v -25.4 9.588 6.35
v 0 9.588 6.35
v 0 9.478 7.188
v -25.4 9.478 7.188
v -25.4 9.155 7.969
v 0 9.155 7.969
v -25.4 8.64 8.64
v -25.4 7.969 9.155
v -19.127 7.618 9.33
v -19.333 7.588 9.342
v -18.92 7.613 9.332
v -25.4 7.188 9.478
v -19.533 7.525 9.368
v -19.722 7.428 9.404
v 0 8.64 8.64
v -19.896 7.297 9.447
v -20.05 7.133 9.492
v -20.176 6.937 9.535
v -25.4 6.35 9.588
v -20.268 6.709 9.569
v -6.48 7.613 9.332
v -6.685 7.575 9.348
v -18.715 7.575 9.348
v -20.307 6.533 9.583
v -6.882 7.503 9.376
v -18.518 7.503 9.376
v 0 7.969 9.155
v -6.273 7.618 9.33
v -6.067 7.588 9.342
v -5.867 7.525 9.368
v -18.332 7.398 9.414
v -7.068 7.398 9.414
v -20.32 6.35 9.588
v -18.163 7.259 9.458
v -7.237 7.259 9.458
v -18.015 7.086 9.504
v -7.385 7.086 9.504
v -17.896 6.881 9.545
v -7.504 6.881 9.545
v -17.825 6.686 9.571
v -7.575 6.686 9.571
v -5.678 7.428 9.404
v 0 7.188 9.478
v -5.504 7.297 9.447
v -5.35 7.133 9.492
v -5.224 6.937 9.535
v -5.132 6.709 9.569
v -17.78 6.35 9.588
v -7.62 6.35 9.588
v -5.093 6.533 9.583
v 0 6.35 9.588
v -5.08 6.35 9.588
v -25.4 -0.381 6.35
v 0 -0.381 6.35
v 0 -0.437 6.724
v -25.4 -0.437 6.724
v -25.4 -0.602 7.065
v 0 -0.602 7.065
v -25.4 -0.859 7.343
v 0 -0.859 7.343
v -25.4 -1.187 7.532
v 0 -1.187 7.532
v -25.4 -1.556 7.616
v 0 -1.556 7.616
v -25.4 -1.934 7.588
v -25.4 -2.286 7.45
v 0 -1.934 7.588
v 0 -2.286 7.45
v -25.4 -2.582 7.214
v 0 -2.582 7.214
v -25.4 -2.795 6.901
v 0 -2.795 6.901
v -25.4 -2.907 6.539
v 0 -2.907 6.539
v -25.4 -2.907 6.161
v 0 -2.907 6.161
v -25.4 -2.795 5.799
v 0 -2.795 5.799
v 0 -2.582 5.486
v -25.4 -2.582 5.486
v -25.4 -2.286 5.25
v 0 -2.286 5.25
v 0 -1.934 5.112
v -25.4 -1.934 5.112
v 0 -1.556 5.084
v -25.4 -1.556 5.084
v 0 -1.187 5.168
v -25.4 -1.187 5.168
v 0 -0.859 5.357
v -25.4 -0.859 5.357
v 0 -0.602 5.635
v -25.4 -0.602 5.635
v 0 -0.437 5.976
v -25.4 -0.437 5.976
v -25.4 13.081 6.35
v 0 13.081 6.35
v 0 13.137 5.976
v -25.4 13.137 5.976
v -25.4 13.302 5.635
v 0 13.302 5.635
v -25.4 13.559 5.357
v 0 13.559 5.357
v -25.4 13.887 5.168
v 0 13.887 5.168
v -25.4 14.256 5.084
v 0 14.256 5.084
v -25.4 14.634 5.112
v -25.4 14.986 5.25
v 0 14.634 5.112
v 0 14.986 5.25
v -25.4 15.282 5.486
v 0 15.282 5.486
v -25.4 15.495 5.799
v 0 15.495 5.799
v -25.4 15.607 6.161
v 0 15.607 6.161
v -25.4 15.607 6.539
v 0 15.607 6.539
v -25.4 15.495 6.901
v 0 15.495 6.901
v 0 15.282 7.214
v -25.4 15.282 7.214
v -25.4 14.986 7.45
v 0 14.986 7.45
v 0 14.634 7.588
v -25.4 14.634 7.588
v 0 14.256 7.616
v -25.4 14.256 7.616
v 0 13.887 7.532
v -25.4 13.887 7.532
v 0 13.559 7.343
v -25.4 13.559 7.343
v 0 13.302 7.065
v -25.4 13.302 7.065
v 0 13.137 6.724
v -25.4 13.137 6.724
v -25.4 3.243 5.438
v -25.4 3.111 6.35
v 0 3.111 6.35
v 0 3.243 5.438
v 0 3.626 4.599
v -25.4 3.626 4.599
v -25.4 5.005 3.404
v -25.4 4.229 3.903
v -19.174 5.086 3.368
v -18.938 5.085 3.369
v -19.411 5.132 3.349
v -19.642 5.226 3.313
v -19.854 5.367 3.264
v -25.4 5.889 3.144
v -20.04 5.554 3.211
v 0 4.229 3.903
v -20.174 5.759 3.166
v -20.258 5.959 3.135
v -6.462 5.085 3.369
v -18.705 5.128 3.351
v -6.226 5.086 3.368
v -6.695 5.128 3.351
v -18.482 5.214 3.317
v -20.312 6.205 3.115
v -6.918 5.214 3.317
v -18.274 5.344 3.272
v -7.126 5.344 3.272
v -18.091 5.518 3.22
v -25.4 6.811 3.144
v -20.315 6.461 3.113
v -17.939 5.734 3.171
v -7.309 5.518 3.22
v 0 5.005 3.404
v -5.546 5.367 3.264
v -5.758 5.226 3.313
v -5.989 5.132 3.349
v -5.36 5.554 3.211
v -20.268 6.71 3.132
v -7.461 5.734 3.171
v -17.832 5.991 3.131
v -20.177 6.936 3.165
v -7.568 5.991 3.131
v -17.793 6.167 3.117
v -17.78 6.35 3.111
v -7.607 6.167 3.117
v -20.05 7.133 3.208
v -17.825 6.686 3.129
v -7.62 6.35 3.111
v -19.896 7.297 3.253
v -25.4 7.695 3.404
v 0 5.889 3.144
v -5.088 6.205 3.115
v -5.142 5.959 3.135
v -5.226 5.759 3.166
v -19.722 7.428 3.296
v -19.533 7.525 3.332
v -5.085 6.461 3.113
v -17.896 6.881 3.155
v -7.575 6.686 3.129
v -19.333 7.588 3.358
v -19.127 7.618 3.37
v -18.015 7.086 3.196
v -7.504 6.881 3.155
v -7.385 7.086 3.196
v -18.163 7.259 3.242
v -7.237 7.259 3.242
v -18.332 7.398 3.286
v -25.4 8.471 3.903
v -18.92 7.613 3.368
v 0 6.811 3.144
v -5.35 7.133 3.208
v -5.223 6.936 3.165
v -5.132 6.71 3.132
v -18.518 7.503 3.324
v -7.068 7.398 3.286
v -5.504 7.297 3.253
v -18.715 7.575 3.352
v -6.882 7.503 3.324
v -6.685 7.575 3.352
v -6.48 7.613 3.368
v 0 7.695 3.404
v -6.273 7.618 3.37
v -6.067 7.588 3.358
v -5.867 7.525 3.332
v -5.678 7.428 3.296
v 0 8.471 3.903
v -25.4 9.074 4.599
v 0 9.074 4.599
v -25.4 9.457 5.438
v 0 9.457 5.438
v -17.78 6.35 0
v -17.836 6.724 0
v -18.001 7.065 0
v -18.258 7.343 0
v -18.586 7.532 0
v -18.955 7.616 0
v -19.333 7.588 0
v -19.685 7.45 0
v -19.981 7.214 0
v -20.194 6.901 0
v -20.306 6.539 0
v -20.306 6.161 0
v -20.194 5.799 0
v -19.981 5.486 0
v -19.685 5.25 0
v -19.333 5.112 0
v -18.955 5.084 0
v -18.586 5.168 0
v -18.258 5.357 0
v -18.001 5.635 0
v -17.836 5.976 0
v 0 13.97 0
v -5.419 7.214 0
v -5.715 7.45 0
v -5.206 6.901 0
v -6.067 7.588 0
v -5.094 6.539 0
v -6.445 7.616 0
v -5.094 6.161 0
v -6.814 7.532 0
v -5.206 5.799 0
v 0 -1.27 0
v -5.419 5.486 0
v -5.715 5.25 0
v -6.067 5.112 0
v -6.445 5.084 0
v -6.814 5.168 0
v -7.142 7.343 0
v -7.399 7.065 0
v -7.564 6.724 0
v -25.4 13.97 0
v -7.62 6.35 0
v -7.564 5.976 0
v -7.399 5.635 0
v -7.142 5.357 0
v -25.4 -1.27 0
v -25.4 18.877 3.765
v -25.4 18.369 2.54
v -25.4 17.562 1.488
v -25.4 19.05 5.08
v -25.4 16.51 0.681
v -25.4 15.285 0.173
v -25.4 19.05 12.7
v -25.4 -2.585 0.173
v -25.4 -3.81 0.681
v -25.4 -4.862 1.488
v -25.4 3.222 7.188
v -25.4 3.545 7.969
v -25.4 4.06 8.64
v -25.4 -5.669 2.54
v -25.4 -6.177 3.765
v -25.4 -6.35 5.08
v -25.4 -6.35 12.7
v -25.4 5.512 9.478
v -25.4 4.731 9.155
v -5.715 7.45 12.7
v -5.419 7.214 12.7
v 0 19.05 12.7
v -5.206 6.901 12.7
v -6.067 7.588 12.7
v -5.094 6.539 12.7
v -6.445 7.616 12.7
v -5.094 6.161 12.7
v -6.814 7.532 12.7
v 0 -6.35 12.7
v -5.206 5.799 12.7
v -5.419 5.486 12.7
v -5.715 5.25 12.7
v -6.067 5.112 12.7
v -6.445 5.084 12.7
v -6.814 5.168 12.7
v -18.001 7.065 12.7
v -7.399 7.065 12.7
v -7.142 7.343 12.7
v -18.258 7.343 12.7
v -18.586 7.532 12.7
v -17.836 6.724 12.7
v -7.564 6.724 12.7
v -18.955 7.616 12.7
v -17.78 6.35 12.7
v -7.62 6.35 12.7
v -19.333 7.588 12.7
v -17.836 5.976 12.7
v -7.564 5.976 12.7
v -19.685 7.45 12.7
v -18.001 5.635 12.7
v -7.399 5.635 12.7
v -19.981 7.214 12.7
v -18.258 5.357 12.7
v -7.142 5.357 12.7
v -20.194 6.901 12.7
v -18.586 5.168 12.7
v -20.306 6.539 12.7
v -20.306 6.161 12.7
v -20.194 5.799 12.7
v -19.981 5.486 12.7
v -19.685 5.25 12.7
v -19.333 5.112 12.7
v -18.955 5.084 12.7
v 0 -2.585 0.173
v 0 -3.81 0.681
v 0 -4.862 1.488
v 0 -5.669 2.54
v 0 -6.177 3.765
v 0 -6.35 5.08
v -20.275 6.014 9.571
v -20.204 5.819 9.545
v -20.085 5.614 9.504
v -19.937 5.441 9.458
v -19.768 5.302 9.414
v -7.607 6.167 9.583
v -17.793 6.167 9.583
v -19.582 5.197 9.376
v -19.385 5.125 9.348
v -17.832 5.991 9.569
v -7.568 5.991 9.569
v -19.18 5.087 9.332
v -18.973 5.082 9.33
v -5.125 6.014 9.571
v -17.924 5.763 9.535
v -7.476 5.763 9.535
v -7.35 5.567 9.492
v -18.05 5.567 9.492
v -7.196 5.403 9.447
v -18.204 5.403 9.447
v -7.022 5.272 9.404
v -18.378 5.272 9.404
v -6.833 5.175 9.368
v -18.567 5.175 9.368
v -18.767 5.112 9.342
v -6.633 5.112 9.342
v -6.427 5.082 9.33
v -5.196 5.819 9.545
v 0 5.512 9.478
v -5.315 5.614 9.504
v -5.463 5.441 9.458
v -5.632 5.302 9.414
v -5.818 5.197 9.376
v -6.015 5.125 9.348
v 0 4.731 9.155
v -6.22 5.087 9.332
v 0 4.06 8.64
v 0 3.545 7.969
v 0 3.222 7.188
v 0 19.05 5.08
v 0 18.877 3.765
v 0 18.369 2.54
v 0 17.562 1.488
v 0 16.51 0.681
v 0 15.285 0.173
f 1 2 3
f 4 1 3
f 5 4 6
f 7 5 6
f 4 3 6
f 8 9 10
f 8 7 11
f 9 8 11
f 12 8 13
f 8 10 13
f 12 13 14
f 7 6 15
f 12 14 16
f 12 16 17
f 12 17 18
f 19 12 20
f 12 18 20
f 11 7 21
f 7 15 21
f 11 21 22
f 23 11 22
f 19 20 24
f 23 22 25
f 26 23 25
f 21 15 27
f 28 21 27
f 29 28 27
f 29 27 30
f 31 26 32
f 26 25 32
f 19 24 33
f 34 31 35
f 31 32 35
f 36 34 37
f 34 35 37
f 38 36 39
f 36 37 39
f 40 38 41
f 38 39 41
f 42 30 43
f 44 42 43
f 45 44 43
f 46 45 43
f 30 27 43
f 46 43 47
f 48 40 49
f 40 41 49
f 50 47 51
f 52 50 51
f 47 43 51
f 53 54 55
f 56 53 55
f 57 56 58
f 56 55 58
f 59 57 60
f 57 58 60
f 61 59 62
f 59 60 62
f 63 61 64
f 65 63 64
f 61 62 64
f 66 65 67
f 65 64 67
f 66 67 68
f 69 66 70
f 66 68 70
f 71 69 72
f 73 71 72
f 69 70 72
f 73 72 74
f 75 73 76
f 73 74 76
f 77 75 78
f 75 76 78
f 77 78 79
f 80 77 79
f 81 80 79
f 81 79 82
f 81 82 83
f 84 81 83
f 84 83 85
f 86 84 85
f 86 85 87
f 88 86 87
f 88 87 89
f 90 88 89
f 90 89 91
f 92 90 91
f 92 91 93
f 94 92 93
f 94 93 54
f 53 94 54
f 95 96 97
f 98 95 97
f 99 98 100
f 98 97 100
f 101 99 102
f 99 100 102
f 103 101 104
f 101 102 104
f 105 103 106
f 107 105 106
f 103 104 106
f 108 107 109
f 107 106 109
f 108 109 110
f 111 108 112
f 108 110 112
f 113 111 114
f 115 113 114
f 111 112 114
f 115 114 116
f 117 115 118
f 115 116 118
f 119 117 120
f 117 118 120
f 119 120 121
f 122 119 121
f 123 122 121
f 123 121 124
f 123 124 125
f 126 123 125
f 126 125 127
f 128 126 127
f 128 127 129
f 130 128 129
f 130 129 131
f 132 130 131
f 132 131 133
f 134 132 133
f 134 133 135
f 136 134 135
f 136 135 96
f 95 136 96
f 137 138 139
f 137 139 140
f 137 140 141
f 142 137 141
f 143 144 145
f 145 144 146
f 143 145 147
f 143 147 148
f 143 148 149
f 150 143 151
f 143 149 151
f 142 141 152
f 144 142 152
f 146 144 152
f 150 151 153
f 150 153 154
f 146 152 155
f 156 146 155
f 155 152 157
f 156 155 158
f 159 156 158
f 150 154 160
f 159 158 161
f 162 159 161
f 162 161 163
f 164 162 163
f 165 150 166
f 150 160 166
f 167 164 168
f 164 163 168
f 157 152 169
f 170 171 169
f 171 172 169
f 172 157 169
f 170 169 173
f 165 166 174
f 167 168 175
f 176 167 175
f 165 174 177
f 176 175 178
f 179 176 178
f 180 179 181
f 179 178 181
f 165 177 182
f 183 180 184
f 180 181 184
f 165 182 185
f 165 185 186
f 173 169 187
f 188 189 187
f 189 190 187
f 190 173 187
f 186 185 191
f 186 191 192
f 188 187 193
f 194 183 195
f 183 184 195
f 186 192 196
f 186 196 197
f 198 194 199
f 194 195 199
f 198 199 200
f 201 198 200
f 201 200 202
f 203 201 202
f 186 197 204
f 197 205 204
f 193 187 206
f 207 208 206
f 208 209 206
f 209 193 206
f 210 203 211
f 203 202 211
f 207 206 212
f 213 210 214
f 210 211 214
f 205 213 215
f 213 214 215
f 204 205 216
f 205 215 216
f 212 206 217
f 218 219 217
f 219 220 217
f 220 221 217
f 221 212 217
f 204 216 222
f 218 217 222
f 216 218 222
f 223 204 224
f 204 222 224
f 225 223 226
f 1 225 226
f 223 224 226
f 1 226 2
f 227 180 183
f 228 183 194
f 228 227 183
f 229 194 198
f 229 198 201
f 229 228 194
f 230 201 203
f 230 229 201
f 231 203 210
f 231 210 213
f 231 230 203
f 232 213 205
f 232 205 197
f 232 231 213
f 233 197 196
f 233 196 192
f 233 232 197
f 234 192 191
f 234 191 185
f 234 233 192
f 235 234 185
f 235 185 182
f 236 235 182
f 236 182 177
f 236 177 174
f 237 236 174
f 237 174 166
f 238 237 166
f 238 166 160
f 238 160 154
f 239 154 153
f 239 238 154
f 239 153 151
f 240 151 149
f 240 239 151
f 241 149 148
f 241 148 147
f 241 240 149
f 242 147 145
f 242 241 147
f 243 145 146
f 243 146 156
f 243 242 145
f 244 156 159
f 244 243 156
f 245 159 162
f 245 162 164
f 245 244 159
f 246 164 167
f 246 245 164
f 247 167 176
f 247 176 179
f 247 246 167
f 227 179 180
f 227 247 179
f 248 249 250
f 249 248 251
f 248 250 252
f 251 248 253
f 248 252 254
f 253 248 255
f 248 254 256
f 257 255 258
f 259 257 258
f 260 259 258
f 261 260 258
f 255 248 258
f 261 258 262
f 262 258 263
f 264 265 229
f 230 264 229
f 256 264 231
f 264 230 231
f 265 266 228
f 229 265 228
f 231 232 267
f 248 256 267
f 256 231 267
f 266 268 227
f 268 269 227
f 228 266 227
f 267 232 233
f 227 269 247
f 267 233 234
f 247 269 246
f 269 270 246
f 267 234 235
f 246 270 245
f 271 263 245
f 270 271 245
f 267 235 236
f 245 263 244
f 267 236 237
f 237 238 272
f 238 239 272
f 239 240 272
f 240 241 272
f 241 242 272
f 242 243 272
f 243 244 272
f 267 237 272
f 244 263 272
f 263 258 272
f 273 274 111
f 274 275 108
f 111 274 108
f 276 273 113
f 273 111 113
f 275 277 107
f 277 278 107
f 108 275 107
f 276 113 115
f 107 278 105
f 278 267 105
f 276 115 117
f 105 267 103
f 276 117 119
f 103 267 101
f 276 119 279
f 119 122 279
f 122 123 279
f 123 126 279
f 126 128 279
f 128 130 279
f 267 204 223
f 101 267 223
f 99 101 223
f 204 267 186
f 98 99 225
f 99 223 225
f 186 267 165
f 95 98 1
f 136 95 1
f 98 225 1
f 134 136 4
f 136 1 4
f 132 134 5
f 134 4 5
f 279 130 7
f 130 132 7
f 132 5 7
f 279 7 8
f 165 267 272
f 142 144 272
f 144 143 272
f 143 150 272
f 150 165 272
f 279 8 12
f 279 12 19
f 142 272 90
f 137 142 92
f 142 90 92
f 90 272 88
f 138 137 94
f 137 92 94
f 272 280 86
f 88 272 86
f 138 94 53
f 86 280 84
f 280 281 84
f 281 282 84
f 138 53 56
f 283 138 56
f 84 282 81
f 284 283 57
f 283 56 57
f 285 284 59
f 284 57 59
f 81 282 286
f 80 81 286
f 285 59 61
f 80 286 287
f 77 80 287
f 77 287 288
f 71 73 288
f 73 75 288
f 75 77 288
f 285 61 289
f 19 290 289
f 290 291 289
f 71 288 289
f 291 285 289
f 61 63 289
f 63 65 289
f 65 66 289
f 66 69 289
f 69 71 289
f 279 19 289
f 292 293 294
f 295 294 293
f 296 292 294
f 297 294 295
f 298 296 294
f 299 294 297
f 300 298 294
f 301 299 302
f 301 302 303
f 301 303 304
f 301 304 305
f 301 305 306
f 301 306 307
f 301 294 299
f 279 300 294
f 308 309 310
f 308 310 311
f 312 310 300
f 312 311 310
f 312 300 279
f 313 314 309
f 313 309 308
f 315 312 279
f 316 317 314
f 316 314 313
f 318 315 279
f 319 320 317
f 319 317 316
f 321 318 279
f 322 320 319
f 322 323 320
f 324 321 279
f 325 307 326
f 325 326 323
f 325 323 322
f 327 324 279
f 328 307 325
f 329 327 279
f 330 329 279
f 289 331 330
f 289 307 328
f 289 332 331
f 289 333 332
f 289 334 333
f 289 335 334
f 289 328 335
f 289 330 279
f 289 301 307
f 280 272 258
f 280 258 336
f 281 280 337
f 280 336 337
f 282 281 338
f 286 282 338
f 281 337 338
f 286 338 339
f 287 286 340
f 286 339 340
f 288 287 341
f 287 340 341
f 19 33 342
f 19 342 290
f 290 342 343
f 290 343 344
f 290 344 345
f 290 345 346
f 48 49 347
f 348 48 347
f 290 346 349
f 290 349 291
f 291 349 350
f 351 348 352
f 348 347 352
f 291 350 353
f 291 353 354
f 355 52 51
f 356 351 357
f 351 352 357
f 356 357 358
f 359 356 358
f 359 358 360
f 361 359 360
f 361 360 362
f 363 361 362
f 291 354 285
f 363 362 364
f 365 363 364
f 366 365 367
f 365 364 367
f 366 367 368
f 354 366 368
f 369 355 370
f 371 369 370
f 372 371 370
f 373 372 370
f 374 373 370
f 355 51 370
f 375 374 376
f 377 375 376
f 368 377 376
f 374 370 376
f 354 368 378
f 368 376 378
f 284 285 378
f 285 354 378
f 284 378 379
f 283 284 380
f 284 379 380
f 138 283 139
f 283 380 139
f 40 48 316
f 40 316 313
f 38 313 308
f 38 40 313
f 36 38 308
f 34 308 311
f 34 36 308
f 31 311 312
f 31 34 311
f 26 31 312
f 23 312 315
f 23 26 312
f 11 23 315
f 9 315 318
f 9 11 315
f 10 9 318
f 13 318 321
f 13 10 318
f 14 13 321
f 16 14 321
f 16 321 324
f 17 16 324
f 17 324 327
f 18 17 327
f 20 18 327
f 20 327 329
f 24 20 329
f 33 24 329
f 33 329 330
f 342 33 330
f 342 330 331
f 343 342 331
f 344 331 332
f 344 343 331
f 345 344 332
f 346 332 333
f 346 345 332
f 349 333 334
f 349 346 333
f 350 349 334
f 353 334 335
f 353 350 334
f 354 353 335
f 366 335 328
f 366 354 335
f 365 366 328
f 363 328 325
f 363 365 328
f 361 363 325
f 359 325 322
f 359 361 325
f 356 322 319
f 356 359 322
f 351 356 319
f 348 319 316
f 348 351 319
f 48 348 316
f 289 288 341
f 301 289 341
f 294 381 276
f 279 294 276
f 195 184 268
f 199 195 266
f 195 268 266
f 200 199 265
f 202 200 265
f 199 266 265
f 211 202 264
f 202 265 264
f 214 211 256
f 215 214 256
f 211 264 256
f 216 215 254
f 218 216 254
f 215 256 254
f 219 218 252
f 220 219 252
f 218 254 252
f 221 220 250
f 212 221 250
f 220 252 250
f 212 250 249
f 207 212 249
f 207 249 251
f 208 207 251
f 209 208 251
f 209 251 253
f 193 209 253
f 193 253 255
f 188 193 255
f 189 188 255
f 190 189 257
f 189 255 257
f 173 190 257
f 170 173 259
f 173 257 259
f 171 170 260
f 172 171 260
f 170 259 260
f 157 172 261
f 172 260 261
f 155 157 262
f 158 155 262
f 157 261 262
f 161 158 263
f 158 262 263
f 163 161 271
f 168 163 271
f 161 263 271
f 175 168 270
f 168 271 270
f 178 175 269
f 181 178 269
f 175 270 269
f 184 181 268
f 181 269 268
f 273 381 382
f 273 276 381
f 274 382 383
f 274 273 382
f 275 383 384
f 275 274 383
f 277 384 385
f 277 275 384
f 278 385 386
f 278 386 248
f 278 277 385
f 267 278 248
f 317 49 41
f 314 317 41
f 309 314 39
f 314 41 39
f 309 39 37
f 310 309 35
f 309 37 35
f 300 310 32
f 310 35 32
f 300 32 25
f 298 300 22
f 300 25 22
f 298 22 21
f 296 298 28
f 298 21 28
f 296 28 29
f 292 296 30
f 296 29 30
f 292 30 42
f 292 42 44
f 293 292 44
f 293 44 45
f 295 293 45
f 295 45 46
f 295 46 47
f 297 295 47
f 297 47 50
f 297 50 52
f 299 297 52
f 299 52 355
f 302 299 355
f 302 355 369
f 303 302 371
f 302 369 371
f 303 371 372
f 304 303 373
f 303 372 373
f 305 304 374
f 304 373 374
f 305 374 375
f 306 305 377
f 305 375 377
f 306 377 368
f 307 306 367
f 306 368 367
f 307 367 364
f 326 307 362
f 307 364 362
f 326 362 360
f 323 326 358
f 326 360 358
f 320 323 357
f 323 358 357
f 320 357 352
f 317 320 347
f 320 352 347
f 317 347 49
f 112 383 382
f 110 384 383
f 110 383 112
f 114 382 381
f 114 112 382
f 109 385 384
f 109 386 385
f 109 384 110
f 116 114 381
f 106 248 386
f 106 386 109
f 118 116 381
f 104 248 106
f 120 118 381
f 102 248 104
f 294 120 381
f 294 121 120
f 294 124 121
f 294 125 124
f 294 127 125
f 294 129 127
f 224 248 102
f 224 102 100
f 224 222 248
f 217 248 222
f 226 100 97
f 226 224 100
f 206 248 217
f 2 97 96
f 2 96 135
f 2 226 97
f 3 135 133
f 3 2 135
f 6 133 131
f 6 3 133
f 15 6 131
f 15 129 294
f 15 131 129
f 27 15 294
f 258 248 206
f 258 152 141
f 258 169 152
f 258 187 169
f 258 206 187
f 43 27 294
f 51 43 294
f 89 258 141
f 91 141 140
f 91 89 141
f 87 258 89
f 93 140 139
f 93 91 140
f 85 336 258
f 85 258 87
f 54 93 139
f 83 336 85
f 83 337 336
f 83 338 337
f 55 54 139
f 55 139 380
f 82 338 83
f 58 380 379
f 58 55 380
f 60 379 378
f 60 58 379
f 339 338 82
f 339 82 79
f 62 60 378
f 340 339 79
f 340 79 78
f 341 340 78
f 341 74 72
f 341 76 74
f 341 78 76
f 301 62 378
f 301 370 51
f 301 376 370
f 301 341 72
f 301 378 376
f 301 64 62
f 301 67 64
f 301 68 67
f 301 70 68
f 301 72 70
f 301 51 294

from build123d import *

# Parameters (mm, degrees)
F0_R     = 1.27
F1_DEPTH = 12.7
F2_DEPTH = 6.35
F3_DEPTH = 6.35
F4_R     = 1.27
F5_DEPTH = 50.8
F6_R     = 5.08


with BuildPart() as f1:
    # F0 (on Top) → F1 (new body)
    with BuildSketch(Plane.XY):
        Polygon((-12.7, 0), (0, 0), (0, 12.7), (-25.4, 12.7), (-25.4, 0), align=None)
        with Locations((-19.05, 6.35)):
            Circle(F0_R, mode=Mode.SUBTRACT)
        with BuildLine():
            ThreePointArc((-5.08, 6.35), (-6.35, 5.08), (-7.62, 6.35))
            ThreePointArc((-7.62, 6.35), (-6.35, 7.62), (-5.08, 6.35))
        make_face(mode=Mode.SUBTRACT)
    extrude(amount=F1_DEPTH)

    # F2 (add): a face of the model
    f2_faces = [f1.faces().sort_by_distance(p)[0] for p in [
        (-12.7, 0, 6.35),
    ]]
    extrude(f2_faces, amount=F2_DEPTH)

    # F3 (add): a face of the model
    f3_faces = [f1.faces().sort_by_distance(p)[0] for p in [
        (-12.7, 12.7, 6.35),
    ]]
    extrude(f3_faces, amount=F3_DEPTH)

    # F4 (on face) → F5 (cut)
    with BuildSketch(Plane.YZ):
        with Locations((-1.651, 6.35)):
            Circle(F4_R)
        with BuildLine():
            Line((6.35, 6.35), (6.35, 9.5885))
            ThreePointArc((6.35, 9.5885), (4.0600346891, 8.6399653109), (3.1115, 6.35))
            Line((3.1115, 6.35), (6.35, 6.35))
        make_face()
        with BuildLine():
            ThreePointArc((9.5885, 6.35), (8.6399653109, 8.6399653109), (6.35, 9.5885))
            Line((6.35, 9.5885), (6.35, 6.35))
            Line((6.35, 6.35), (9.5885, 6.35))
        make_face()
        with BuildLine():
            Line((9.5885, 6.35), (6.35, 6.35))
            Line((6.35, 6.35), (3.1115, 6.35))
            ThreePointArc((3.1115, 6.35), (6.35, 3.1115), (9.5885, 6.35))
        make_face()
        with BuildLine():
            ThreePointArc((15.621, 6.35), (14.351, 7.62), (13.081, 6.35))
            ThreePointArc((13.081, 6.35), (14.351, 5.08), (15.621, 6.35))
        make_face()
    extrude(amount=-F5_DEPTH, mode=Mode.SUBTRACT)

    # F6
    f6_edges = [f1.edges().sort_by_distance(p)[0] for p in [
        (-12.7, -6.35, 0),
        (-12.7, 19.05, 0),
    ]]
    fillet(f6_edges, radius=F6_R)


solid = f1.part
